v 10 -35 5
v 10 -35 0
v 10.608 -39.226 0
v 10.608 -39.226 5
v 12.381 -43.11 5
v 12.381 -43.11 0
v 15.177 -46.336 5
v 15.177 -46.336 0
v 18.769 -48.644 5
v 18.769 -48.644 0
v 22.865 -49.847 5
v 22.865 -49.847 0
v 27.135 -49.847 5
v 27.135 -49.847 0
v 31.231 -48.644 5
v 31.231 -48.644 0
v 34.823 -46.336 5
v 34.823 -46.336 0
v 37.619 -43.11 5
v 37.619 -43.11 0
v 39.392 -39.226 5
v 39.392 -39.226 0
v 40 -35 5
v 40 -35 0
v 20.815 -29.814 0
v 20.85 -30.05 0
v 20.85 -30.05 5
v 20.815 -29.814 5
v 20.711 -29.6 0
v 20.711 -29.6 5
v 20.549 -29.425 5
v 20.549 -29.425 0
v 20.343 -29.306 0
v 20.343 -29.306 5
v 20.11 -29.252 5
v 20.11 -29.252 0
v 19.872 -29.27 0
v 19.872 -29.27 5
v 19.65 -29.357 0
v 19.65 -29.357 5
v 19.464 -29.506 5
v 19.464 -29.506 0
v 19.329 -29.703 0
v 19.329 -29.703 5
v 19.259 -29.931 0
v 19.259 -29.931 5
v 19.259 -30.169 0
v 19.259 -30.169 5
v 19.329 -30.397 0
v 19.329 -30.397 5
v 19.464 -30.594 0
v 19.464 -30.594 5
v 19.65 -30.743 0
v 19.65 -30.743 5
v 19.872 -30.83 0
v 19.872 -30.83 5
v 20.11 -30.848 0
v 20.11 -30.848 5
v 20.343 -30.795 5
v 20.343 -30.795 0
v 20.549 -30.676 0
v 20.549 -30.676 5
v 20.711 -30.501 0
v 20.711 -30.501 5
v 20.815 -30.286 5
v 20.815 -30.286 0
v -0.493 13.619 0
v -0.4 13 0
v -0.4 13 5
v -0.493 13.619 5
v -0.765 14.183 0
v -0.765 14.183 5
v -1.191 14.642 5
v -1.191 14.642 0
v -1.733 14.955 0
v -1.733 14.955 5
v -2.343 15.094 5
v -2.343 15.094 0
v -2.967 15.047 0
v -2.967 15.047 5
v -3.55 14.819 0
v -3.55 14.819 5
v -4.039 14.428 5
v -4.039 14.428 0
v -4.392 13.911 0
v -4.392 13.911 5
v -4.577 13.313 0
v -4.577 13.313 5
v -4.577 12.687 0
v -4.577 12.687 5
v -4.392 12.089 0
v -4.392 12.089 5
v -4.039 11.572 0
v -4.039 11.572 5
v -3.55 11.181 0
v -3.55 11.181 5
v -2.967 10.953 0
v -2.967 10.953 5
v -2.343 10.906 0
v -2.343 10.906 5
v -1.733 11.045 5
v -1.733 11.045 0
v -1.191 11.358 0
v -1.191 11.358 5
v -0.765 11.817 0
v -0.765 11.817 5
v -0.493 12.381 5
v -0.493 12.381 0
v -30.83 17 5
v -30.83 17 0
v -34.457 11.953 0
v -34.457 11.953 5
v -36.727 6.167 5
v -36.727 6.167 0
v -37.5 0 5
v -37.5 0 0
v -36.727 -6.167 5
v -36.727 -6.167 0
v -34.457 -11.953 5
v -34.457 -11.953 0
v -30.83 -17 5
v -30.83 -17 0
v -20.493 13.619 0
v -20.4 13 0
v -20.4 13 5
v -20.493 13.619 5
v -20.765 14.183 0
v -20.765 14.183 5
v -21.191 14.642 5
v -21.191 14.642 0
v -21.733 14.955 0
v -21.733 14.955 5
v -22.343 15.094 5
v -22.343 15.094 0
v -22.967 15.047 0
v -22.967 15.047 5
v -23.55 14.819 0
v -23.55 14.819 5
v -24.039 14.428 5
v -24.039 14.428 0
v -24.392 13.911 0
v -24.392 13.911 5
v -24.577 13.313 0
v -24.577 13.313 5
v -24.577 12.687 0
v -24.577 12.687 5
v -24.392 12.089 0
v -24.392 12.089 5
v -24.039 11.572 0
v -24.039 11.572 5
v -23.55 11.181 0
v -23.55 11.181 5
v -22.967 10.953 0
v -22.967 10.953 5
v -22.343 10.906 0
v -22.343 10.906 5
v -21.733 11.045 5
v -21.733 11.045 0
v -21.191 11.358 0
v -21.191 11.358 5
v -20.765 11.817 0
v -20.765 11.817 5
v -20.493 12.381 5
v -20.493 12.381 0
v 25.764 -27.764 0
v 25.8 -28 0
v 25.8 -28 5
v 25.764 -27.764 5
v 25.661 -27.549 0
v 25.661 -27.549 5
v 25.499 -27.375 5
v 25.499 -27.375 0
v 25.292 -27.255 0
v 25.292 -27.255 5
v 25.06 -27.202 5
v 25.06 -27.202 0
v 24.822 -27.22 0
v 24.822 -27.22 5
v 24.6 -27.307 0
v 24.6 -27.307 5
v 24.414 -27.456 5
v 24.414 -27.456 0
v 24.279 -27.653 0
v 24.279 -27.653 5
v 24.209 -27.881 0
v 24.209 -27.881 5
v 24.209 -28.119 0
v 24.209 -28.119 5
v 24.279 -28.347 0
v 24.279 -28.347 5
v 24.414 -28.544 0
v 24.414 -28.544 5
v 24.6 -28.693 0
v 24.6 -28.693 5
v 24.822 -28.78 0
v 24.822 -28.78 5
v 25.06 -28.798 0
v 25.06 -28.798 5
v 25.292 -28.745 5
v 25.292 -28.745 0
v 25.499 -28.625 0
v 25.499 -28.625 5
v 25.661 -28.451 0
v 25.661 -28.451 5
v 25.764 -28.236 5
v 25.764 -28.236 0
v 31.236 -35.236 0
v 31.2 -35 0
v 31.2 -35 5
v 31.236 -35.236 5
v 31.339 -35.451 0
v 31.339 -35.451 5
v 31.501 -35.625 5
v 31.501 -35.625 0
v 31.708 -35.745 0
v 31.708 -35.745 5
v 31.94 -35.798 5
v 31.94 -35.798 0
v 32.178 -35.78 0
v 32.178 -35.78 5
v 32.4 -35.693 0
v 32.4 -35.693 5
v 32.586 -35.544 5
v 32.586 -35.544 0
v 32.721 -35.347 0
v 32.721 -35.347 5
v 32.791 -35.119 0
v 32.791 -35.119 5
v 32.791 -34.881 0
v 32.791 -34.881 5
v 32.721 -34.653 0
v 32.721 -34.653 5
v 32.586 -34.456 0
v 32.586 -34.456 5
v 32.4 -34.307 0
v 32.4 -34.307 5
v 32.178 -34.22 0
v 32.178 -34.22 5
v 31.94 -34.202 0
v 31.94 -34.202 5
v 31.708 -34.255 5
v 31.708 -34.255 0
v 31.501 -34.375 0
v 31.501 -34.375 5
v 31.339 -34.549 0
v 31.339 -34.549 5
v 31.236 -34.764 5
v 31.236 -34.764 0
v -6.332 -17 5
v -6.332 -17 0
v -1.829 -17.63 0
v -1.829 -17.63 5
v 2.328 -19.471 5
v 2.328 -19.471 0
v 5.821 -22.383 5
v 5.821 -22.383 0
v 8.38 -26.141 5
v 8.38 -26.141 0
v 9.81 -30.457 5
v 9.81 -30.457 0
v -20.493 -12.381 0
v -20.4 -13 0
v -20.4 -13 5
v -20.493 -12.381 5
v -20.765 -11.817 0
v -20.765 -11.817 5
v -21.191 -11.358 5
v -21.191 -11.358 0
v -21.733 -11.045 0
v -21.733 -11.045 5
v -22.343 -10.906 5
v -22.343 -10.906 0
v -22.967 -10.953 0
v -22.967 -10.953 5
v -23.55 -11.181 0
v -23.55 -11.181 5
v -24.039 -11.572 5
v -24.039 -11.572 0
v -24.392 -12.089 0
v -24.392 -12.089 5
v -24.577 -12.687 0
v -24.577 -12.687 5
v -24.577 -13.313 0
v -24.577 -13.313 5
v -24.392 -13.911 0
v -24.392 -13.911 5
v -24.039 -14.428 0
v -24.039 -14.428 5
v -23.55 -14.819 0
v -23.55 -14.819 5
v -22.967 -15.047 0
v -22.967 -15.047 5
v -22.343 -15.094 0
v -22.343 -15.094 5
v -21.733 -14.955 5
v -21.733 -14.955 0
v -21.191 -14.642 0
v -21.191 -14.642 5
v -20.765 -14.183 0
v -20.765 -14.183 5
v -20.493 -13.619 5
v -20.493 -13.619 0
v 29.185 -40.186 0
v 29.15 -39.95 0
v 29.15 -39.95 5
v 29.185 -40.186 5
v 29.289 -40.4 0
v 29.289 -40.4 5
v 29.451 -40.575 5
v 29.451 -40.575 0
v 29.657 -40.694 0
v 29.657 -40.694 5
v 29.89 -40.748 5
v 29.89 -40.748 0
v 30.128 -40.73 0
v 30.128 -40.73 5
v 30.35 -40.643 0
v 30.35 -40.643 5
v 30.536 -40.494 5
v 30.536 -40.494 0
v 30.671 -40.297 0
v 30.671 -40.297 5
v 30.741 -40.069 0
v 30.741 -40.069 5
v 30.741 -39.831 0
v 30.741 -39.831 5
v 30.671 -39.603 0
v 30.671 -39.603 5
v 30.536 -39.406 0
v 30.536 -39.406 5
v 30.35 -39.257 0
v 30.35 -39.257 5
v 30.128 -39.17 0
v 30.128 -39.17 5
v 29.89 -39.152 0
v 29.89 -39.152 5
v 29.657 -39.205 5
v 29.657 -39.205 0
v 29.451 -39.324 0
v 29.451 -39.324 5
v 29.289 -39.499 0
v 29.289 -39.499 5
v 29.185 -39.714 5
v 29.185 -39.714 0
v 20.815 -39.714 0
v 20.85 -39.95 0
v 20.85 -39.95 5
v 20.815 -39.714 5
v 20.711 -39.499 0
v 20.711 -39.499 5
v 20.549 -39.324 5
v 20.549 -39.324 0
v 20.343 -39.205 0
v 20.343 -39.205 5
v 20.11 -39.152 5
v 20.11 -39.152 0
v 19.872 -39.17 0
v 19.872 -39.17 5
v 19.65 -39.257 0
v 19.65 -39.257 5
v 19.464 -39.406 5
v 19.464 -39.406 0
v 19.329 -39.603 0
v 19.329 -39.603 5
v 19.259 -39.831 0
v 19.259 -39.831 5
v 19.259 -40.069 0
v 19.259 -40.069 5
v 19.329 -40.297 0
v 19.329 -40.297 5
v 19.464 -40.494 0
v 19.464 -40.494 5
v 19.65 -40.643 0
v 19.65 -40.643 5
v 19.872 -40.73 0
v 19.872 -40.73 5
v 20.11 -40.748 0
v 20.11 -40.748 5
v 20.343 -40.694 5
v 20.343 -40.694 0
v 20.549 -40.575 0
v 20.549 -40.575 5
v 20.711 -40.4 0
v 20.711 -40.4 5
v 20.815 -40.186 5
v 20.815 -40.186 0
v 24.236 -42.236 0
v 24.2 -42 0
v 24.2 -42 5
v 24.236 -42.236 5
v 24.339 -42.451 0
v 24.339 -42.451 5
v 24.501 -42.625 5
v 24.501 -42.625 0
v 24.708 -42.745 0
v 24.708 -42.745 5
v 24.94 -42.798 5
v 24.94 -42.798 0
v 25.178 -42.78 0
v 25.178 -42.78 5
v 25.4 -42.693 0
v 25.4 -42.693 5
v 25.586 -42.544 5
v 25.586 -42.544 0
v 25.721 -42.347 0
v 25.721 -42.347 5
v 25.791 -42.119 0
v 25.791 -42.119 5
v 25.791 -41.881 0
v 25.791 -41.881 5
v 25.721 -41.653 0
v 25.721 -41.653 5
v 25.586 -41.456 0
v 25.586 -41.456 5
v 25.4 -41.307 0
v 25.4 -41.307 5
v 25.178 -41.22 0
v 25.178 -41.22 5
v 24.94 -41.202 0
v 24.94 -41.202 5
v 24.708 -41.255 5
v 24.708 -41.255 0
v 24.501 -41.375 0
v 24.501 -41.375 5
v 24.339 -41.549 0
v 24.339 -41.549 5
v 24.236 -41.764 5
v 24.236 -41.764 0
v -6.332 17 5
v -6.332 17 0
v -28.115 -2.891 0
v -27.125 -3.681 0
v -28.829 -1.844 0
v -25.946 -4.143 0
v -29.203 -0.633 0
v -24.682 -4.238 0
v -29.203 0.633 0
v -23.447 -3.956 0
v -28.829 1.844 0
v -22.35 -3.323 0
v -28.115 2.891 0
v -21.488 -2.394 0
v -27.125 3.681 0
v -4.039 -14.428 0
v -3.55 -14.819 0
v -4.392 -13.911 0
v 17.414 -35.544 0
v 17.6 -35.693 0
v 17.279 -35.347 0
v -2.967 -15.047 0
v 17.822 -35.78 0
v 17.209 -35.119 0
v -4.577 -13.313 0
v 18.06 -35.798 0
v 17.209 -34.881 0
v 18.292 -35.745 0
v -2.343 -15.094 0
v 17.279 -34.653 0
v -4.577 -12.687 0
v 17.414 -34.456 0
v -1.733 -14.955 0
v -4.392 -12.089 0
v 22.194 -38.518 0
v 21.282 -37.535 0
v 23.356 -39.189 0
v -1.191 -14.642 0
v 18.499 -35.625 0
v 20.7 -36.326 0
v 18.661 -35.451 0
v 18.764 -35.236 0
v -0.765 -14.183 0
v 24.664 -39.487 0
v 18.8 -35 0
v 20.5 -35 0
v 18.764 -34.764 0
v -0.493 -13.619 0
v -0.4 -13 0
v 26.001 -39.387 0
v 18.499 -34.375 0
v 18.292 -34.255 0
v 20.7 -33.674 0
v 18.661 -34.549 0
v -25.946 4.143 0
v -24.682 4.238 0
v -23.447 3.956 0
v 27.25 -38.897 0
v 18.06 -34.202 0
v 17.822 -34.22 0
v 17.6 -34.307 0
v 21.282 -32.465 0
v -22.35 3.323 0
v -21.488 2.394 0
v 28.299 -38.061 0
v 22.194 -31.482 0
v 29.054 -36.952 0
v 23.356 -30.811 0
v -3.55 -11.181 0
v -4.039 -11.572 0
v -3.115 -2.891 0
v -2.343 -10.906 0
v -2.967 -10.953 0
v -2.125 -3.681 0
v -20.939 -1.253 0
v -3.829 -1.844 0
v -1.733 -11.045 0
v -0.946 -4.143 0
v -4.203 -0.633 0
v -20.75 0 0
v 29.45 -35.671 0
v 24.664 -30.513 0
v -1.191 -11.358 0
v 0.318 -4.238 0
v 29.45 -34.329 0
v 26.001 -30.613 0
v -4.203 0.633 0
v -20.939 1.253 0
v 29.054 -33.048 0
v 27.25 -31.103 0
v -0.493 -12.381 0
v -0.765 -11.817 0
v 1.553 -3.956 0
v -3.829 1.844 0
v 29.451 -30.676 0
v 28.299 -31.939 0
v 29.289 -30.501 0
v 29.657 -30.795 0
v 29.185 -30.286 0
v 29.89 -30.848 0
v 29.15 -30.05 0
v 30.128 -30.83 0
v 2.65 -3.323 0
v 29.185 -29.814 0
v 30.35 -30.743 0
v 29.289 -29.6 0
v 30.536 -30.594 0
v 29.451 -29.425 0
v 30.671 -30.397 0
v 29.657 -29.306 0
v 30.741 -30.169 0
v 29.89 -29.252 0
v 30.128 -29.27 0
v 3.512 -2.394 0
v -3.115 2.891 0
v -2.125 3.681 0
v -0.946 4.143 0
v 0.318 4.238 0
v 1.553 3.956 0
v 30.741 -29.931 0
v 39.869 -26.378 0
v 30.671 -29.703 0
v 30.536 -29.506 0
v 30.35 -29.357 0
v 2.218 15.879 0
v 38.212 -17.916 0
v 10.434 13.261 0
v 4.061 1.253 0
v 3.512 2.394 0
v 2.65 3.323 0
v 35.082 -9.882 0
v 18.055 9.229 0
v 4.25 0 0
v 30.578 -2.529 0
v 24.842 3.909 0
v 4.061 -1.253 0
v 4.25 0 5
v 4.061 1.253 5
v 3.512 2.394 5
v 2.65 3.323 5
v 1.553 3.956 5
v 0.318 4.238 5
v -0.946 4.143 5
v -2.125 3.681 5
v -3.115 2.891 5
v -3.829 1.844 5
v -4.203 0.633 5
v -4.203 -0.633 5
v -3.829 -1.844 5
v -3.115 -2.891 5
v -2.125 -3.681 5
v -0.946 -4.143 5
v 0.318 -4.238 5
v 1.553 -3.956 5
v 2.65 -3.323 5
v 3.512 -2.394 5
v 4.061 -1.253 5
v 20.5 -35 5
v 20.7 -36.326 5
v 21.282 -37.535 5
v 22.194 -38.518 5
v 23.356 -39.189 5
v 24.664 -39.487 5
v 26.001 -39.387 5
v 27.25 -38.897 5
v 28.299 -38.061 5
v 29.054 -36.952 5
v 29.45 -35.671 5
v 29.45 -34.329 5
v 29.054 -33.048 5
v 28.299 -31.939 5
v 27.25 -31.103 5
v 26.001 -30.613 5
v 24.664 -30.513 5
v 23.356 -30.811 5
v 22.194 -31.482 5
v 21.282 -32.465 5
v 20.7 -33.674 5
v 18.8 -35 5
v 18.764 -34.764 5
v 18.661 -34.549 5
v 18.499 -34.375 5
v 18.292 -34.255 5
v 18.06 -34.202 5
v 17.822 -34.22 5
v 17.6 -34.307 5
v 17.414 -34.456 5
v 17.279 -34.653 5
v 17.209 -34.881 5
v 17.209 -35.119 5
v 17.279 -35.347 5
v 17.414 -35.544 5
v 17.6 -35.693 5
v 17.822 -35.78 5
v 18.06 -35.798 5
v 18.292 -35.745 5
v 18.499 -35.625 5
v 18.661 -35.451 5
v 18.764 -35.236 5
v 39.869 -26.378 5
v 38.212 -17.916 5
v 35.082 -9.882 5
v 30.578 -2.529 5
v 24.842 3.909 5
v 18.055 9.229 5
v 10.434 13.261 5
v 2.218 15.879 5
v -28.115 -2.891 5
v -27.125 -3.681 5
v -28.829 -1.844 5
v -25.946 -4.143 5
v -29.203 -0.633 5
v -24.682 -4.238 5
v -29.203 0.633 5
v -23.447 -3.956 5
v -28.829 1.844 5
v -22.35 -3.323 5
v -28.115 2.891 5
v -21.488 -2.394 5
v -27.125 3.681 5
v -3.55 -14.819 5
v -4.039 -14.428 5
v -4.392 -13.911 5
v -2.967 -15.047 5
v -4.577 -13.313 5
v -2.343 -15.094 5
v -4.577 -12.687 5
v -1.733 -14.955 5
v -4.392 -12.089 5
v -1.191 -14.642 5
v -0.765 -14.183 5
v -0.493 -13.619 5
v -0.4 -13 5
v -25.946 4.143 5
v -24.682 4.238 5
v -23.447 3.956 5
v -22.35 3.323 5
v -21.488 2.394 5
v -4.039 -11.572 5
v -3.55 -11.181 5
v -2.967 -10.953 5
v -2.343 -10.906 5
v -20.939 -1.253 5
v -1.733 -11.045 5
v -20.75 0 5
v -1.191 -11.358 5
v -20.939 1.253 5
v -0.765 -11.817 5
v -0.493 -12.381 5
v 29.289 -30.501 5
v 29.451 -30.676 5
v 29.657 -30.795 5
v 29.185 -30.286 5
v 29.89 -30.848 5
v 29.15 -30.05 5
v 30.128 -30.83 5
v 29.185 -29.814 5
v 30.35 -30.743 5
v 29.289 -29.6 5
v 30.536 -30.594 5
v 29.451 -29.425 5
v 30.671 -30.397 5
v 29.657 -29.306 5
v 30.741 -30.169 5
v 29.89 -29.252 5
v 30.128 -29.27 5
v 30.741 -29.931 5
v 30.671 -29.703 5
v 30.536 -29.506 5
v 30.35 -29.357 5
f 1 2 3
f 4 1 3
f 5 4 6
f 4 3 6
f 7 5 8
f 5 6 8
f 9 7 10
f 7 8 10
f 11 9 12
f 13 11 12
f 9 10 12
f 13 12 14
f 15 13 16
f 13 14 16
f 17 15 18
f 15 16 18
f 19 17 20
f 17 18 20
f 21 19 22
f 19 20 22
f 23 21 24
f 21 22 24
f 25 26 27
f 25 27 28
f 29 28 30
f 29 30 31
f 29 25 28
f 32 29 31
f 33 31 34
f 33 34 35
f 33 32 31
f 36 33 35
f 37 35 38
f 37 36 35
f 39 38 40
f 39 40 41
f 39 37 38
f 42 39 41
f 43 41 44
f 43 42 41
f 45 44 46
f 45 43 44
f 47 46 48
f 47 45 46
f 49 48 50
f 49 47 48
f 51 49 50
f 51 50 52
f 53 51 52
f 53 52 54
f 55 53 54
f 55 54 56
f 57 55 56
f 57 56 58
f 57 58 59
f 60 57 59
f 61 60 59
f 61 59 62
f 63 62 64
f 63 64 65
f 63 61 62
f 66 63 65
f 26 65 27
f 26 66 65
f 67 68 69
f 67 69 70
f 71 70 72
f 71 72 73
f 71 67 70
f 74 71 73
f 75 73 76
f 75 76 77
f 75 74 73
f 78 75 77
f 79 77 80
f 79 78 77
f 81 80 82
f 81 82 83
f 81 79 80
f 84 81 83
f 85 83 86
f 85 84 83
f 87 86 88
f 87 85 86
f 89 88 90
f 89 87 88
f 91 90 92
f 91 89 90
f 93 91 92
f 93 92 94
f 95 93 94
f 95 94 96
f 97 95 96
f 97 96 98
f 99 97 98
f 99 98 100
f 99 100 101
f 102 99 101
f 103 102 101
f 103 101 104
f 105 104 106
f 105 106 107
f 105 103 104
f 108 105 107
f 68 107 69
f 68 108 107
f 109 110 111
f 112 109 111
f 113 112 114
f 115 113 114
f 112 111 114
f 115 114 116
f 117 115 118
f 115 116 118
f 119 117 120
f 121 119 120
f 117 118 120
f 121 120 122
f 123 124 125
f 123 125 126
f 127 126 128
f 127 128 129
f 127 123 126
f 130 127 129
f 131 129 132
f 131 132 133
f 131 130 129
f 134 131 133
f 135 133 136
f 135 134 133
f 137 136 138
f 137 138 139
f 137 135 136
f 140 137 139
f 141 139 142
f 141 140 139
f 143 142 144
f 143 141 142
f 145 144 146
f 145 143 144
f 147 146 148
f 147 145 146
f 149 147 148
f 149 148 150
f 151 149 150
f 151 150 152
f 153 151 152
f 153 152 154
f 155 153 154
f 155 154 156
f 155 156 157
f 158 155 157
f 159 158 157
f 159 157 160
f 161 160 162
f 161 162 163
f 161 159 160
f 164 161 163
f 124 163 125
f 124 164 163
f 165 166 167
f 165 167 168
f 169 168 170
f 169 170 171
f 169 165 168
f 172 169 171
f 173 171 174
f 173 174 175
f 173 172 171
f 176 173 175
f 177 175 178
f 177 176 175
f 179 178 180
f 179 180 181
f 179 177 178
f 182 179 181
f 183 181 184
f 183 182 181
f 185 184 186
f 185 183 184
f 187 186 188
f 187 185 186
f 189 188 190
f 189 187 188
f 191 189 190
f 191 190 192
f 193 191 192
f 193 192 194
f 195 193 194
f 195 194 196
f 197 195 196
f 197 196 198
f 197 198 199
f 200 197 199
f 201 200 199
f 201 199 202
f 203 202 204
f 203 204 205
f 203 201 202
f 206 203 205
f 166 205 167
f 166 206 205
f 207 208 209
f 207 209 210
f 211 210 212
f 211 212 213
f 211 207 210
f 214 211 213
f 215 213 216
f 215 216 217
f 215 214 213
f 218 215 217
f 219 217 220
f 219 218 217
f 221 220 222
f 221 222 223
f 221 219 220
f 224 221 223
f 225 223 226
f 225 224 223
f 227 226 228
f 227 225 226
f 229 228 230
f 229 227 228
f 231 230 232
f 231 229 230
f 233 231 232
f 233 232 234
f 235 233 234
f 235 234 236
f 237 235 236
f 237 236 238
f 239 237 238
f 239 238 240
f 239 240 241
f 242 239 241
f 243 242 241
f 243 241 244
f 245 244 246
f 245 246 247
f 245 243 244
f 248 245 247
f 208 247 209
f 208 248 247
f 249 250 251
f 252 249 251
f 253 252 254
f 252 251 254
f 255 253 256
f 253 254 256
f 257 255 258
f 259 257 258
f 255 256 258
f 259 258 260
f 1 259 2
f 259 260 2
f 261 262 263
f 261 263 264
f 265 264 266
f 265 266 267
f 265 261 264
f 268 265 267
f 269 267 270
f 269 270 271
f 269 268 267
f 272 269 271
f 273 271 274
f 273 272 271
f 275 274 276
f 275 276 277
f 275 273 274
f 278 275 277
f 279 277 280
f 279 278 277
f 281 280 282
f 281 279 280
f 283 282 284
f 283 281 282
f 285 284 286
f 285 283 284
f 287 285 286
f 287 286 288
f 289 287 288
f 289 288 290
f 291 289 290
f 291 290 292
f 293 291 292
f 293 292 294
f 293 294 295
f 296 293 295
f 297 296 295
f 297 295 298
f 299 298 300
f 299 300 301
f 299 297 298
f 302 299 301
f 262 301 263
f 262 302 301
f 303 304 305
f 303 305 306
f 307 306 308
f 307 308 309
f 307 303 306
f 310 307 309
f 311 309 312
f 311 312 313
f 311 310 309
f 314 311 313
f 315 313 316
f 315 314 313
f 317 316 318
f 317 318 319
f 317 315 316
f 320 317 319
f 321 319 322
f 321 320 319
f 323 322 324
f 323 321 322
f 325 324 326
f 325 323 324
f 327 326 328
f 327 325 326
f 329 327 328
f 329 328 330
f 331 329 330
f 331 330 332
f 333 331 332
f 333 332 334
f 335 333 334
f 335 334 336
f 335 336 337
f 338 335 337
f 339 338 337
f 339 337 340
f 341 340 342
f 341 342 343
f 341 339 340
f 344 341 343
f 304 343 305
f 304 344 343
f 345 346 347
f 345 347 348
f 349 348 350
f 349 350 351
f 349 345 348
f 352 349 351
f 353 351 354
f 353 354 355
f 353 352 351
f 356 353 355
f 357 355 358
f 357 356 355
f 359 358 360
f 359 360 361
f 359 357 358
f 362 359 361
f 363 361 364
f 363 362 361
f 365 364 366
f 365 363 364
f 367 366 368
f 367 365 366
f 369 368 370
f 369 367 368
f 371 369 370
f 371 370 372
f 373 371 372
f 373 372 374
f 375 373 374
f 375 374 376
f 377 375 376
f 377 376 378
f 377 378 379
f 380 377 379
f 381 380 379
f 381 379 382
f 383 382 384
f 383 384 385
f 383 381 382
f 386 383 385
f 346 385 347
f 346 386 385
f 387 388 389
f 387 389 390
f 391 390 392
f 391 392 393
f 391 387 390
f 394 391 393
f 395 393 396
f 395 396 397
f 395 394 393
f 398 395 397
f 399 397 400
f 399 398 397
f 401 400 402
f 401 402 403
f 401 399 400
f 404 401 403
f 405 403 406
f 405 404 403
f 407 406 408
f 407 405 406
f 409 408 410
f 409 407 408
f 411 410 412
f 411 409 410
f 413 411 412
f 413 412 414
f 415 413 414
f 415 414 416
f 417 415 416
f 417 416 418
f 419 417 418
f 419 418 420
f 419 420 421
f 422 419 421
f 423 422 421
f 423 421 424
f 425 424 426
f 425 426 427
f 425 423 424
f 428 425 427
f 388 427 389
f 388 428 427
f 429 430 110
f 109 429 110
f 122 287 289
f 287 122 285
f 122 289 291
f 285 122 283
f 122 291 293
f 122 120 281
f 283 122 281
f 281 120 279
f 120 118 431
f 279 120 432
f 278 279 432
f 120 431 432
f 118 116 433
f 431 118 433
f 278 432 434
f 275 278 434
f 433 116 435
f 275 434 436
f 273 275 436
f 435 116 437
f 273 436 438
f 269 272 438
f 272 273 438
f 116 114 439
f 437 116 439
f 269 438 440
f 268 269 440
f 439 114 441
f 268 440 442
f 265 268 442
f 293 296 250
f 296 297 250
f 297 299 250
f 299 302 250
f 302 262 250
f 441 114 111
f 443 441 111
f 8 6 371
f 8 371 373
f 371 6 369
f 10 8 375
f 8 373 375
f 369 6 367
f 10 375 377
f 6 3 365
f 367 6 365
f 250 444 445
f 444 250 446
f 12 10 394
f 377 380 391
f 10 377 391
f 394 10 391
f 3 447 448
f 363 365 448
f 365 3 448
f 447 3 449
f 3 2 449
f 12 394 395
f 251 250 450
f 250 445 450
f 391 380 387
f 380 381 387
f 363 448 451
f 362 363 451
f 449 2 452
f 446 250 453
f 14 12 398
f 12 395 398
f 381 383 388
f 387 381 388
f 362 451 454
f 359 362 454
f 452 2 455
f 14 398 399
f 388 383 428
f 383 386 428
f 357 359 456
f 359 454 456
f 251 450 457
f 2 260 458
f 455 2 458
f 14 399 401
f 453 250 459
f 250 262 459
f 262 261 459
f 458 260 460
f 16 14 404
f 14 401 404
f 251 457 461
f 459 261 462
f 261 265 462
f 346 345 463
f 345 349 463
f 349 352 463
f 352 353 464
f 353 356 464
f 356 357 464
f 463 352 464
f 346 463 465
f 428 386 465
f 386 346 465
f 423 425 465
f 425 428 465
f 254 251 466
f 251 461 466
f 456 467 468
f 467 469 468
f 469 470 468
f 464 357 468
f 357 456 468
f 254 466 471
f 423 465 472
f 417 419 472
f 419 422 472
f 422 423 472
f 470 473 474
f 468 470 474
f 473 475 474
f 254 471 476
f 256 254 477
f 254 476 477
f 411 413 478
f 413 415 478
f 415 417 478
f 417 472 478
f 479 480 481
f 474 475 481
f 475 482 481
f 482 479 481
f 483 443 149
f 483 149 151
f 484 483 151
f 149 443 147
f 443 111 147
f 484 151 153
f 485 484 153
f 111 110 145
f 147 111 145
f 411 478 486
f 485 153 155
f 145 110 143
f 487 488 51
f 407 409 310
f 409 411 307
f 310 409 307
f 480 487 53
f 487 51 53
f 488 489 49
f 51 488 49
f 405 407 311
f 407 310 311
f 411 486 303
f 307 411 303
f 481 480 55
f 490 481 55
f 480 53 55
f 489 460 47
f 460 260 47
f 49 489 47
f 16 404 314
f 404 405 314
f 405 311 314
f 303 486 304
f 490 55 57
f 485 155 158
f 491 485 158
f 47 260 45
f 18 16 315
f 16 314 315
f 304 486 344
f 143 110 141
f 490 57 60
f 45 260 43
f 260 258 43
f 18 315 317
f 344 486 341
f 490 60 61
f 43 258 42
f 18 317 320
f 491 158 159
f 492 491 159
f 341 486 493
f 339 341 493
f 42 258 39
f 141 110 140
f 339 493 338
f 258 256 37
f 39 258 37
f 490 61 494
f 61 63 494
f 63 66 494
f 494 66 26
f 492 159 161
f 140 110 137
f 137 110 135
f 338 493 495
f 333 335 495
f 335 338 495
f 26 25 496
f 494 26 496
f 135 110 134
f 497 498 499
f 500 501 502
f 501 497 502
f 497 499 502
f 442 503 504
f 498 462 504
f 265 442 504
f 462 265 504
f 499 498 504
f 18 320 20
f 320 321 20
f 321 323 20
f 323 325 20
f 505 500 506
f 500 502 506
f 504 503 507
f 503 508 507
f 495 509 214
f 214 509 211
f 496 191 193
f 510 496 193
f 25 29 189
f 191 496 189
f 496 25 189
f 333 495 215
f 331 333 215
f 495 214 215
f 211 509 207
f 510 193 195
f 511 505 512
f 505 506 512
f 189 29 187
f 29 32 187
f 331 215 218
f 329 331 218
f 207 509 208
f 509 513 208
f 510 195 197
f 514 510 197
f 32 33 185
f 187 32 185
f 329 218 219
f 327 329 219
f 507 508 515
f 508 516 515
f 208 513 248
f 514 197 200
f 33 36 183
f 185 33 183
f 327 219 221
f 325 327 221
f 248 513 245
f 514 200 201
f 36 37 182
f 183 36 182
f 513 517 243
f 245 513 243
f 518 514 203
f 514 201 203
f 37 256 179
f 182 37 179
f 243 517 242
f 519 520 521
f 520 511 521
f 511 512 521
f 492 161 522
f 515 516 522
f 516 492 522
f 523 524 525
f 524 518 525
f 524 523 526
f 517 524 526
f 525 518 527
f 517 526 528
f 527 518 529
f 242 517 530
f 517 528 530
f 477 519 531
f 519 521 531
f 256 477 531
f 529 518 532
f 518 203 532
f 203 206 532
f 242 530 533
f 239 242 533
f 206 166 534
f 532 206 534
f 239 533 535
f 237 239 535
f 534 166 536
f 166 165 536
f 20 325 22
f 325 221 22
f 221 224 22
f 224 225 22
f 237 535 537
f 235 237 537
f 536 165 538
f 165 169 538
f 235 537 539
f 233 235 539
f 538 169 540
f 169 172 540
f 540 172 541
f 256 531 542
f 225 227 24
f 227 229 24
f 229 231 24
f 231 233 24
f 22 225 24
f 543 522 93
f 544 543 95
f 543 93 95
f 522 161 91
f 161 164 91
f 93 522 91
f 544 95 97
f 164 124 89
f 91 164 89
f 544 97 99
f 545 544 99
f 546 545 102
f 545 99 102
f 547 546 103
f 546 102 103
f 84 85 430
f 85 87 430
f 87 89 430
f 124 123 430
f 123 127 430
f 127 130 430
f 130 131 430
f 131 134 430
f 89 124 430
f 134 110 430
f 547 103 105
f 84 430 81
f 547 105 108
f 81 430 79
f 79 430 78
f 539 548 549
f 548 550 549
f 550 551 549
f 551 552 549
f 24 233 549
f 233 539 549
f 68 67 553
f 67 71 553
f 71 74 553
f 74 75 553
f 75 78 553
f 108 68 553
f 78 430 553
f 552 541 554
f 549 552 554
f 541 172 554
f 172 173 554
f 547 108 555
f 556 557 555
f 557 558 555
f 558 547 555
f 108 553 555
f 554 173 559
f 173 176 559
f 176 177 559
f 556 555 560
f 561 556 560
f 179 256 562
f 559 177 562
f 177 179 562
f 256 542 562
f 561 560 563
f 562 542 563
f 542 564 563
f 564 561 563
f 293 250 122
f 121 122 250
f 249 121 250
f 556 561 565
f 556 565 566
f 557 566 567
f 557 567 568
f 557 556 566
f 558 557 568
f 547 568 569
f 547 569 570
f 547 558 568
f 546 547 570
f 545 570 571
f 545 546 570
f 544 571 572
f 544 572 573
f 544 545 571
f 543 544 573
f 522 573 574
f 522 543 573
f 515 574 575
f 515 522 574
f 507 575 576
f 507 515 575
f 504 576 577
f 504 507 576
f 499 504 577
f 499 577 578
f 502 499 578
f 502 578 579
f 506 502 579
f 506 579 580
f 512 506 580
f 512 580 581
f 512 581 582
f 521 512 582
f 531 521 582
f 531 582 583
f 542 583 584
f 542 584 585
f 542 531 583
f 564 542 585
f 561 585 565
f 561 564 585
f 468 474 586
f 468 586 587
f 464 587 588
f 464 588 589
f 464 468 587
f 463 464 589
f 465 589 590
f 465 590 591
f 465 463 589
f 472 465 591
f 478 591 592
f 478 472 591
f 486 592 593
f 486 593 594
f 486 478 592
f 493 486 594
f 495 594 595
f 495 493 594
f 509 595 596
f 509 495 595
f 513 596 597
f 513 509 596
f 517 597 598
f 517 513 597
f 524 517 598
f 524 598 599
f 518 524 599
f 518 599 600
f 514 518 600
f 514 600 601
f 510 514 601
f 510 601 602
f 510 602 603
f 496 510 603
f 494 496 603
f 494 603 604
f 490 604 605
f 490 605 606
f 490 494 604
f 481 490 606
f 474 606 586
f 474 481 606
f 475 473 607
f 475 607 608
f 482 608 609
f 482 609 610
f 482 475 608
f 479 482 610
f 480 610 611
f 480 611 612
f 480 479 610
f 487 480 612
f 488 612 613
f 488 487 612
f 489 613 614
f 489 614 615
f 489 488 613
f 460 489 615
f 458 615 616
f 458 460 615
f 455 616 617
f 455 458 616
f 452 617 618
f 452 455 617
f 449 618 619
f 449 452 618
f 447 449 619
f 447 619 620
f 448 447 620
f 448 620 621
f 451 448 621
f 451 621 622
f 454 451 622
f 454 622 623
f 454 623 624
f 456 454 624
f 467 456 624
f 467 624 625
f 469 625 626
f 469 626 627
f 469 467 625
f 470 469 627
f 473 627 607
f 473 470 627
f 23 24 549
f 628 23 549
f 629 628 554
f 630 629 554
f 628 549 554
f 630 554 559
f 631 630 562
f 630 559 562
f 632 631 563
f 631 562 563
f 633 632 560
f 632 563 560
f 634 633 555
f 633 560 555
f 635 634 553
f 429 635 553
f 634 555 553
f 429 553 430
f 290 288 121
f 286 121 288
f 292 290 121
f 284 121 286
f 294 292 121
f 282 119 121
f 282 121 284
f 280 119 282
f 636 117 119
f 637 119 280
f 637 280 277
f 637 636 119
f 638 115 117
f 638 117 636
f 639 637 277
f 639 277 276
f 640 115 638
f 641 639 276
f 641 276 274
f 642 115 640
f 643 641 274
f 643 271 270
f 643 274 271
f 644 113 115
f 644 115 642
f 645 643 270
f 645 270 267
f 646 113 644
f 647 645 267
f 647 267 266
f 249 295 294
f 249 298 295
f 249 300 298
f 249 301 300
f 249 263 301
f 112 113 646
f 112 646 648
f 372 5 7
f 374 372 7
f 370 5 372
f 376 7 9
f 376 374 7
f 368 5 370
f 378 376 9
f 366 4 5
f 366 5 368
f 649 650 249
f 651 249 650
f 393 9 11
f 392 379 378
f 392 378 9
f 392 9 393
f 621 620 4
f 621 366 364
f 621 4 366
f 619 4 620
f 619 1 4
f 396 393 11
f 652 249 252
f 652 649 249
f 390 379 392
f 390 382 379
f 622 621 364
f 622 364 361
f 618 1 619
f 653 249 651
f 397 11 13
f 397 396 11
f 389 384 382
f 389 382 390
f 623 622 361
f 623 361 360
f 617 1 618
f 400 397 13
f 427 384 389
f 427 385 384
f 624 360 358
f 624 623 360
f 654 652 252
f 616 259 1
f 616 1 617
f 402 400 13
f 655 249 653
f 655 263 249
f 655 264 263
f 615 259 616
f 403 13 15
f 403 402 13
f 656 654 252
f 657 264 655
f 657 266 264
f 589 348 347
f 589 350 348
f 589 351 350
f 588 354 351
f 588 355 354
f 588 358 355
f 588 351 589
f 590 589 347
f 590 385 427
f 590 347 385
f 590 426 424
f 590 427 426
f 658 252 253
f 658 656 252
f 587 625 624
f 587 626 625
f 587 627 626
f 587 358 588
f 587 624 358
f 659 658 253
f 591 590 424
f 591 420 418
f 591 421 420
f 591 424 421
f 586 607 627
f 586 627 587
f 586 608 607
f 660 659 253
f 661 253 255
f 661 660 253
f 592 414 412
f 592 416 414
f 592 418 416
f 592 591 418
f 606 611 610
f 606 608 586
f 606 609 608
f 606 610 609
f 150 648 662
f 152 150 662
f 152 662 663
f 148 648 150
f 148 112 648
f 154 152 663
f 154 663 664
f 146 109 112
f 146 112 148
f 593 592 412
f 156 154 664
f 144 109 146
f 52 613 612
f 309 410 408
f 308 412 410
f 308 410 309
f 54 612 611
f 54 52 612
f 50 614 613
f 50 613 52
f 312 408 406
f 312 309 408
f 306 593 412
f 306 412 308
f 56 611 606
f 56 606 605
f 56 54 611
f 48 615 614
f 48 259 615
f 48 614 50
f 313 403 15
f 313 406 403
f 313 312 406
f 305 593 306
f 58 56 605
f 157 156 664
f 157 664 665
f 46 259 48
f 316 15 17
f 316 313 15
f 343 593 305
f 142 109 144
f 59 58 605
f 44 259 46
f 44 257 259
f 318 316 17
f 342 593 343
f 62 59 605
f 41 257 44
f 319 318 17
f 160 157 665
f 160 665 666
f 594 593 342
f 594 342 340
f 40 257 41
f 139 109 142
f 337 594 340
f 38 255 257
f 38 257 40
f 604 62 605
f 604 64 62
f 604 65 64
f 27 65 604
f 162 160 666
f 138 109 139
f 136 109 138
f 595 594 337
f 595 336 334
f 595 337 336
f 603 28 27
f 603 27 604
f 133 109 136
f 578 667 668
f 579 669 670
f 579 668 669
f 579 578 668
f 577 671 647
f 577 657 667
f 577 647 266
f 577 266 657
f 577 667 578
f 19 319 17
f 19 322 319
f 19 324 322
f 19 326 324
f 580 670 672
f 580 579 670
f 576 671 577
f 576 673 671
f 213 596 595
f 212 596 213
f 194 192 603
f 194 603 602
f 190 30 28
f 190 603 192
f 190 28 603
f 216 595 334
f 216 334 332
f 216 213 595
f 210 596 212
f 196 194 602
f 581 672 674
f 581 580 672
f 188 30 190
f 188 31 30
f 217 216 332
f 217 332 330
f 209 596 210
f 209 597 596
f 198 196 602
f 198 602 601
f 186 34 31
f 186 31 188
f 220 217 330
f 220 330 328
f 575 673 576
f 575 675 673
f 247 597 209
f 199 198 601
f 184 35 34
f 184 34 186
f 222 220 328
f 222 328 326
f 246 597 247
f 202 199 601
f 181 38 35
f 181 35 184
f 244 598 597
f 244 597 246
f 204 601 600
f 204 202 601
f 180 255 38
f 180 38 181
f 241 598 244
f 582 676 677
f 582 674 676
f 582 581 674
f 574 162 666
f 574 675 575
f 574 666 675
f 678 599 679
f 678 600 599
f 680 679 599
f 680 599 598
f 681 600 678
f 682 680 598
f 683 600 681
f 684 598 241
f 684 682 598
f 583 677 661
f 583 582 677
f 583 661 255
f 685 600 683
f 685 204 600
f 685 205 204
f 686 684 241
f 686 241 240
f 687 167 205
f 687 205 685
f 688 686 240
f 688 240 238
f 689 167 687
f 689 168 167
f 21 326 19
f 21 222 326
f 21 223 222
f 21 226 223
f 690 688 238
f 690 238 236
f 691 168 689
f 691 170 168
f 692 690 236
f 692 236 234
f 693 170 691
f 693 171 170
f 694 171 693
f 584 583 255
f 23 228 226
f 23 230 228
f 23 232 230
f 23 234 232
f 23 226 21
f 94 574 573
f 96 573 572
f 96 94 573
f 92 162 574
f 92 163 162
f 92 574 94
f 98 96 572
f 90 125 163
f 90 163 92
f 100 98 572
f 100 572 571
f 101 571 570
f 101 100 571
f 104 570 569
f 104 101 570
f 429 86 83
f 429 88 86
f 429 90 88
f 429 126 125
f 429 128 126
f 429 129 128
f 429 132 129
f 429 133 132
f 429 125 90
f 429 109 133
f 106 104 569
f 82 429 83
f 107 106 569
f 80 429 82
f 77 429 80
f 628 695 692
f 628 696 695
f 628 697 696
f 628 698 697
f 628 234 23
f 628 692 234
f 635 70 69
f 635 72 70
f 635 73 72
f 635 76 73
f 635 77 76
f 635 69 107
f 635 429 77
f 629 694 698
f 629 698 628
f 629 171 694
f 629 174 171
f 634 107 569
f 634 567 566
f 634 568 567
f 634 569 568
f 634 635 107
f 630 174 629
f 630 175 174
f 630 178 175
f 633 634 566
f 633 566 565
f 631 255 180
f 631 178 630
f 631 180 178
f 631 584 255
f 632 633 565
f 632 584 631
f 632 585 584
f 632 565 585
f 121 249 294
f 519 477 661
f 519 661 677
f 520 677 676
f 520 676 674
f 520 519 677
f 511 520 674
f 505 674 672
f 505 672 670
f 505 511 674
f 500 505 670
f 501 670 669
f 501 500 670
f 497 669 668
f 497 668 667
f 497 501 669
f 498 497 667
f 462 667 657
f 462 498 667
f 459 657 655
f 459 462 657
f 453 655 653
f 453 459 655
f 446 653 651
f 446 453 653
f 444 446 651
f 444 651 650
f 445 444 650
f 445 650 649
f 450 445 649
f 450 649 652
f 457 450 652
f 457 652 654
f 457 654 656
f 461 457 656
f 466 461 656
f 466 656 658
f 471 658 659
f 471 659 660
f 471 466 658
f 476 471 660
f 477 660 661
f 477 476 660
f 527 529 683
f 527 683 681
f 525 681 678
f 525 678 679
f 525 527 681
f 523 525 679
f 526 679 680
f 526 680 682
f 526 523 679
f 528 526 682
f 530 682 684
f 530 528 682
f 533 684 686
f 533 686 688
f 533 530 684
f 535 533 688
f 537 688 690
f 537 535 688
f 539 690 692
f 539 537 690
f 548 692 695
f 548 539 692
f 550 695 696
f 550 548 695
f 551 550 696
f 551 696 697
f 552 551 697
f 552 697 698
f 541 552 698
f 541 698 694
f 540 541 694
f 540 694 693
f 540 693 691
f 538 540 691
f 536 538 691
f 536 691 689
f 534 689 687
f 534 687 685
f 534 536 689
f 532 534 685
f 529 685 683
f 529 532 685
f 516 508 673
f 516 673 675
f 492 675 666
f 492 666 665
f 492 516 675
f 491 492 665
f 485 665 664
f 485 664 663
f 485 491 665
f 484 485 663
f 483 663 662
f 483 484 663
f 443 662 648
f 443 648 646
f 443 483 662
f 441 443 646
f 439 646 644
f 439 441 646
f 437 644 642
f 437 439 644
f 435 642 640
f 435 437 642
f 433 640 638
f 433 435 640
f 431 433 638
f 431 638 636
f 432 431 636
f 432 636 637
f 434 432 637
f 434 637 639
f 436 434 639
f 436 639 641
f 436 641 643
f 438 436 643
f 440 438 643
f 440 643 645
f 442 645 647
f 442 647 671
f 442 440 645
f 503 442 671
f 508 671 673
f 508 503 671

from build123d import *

# Parameters (mm, degrees)
SKETCH1_R           = 2.1
SKETCH1_R_2         = 4.25
BOSS_EXTRUDE1_DEPTH = 5


with BuildPart() as part:
    # Sketch1 → Boss-Extrude1 (new body)
    # profile 1 of 2: a face of its own
    with BuildSketch(Plane.XY):
        with BuildLine():
            Line((-6.331773263, 17), (-30.83030278, 17))
            ThreePointArc((-30.83030278, 17), (-37.5, 0), (-30.83030278, -17))
            Line((-30.83030278, -17), (-6.331773263, -17))
            ThreePointArc((-6.331773263, -17), (5.820650879, -22.382931848), (10, -35))
            ThreePointArc((10, -35), (25, -50), (40, -35))
            ThreePointArc((40, -35), (27.853135577, 0.817900741), (-6.331773263, 17))
        make_face()
        with BuildLine():
            ThreePointArc((34.5, -35), (25, -44.5), (15.5, -35))
            ThreePointArc((15.5, -35), (25, -25.5), (34.5, -35))
        make_face(mode=Mode.SUBTRACT)
        with Locations((-22.5, -13)):
            Circle(SKETCH1_R, mode=Mode.SUBTRACT)
        with Locations((-25, 0)):
            Circle(SKETCH1_R_2, mode=Mode.SUBTRACT)
        with Locations((-2.5, -13)):
            Circle(SKETCH1_R, mode=Mode.SUBTRACT)
        Circle(SKETCH1_R_2, mode=Mode.SUBTRACT)
        with Locations((-22.5, 13)):
            Circle(SKETCH1_R, mode=Mode.SUBTRACT)
        with Locations((-2.5, 13)):
            Circle(SKETCH1_R, mode=Mode.SUBTRACT)
    # profile 2 of 2: a face of its own
    with BuildSketch(Plane.XY):
        with BuildLine():
            ThreePointArc((15.5, -35), (25, -44.5), (34.5, -35))
            ThreePointArc((34.5, -35), (25, -25.5), (15.5, -35))
        make_face()
        with BuildLine():
            ThreePointArc((24.2, -28), (25, -28.8), (25.8, -28))
            ThreePointArc((25.8, -28), (25, -27.2), (24.2, -28))
        make_face(mode=Mode.SUBTRACT)
        with BuildLine():
            ThreePointArc((30.749747468, -30.050252532), (29.949747468, -29.250252532), (29.149747468, -30.050252532))
            ThreePointArc((29.149747468, -30.050252532), (29.949747468, -30.850252532), (30.749747468, -30.050252532))
        make_face(mode=Mode.SUBTRACT)
        with BuildLine():
            ThreePointArc((32.8, -35), (32, -34.2), (31.2, -35))
            ThreePointArc((31.2, -35), (32, -35.8), (32.8, -35))
        make_face(mode=Mode.SUBTRACT)
        with BuildLine():
            ThreePointArc((30.749747468, -39.949747468), (29.949747468, -39.149747468), (29.149747468, -39.949747468))
            ThreePointArc((29.149747468, -39.949747468), (29.949747468, -40.749747468), (30.749747468, -39.949747468))
        make_face(mode=Mode.SUBTRACT)
        with BuildLine():
            ThreePointArc((25.8, -42), (25, -41.2), (24.2, -42))
            ThreePointArc((24.2, -42), (25, -42.8), (25.8, -42))
        make_face(mode=Mode.SUBTRACT)
        with BuildLine():
            ThreePointArc((19.250252532, -39.949747468), (20.050252532, -40.749747468), (20.850252532, -39.949747468))
            ThreePointArc((20.850252532, -39.949747468), (20.050252532, -39.149747468), (19.250252532, -39.949747468))
        make_face(mode=Mode.SUBTRACT)
        with BuildLine():
            ThreePointArc((17.2, -35), (18, -35.8), (18.8, -35))
            ThreePointArc((18.8, -35), (18, -34.2), (17.2, -35))
        make_face(mode=Mode.SUBTRACT)
        with BuildLine():
            ThreePointArc((19.250252532, -30.050252532), (20.050252532, -30.850252532), (20.850252532, -30.050252532))
            ThreePointArc((20.850252532, -30.050252532), (20.050252532, -29.250252532), (19.250252532, -30.050252532))
        make_face(mode=Mode.SUBTRACT)
        with BuildLine():
            ThreePointArc((29.5, -35), (25, -30.5), (20.5, -35))
            ThreePointArc((20.5, -35), (25, -39.5), (29.5, -35))
        make_face(mode=Mode.SUBTRACT)
    extrude(amount=BOSS_EXTRUDE1_DEPTH)


solid = part.part
